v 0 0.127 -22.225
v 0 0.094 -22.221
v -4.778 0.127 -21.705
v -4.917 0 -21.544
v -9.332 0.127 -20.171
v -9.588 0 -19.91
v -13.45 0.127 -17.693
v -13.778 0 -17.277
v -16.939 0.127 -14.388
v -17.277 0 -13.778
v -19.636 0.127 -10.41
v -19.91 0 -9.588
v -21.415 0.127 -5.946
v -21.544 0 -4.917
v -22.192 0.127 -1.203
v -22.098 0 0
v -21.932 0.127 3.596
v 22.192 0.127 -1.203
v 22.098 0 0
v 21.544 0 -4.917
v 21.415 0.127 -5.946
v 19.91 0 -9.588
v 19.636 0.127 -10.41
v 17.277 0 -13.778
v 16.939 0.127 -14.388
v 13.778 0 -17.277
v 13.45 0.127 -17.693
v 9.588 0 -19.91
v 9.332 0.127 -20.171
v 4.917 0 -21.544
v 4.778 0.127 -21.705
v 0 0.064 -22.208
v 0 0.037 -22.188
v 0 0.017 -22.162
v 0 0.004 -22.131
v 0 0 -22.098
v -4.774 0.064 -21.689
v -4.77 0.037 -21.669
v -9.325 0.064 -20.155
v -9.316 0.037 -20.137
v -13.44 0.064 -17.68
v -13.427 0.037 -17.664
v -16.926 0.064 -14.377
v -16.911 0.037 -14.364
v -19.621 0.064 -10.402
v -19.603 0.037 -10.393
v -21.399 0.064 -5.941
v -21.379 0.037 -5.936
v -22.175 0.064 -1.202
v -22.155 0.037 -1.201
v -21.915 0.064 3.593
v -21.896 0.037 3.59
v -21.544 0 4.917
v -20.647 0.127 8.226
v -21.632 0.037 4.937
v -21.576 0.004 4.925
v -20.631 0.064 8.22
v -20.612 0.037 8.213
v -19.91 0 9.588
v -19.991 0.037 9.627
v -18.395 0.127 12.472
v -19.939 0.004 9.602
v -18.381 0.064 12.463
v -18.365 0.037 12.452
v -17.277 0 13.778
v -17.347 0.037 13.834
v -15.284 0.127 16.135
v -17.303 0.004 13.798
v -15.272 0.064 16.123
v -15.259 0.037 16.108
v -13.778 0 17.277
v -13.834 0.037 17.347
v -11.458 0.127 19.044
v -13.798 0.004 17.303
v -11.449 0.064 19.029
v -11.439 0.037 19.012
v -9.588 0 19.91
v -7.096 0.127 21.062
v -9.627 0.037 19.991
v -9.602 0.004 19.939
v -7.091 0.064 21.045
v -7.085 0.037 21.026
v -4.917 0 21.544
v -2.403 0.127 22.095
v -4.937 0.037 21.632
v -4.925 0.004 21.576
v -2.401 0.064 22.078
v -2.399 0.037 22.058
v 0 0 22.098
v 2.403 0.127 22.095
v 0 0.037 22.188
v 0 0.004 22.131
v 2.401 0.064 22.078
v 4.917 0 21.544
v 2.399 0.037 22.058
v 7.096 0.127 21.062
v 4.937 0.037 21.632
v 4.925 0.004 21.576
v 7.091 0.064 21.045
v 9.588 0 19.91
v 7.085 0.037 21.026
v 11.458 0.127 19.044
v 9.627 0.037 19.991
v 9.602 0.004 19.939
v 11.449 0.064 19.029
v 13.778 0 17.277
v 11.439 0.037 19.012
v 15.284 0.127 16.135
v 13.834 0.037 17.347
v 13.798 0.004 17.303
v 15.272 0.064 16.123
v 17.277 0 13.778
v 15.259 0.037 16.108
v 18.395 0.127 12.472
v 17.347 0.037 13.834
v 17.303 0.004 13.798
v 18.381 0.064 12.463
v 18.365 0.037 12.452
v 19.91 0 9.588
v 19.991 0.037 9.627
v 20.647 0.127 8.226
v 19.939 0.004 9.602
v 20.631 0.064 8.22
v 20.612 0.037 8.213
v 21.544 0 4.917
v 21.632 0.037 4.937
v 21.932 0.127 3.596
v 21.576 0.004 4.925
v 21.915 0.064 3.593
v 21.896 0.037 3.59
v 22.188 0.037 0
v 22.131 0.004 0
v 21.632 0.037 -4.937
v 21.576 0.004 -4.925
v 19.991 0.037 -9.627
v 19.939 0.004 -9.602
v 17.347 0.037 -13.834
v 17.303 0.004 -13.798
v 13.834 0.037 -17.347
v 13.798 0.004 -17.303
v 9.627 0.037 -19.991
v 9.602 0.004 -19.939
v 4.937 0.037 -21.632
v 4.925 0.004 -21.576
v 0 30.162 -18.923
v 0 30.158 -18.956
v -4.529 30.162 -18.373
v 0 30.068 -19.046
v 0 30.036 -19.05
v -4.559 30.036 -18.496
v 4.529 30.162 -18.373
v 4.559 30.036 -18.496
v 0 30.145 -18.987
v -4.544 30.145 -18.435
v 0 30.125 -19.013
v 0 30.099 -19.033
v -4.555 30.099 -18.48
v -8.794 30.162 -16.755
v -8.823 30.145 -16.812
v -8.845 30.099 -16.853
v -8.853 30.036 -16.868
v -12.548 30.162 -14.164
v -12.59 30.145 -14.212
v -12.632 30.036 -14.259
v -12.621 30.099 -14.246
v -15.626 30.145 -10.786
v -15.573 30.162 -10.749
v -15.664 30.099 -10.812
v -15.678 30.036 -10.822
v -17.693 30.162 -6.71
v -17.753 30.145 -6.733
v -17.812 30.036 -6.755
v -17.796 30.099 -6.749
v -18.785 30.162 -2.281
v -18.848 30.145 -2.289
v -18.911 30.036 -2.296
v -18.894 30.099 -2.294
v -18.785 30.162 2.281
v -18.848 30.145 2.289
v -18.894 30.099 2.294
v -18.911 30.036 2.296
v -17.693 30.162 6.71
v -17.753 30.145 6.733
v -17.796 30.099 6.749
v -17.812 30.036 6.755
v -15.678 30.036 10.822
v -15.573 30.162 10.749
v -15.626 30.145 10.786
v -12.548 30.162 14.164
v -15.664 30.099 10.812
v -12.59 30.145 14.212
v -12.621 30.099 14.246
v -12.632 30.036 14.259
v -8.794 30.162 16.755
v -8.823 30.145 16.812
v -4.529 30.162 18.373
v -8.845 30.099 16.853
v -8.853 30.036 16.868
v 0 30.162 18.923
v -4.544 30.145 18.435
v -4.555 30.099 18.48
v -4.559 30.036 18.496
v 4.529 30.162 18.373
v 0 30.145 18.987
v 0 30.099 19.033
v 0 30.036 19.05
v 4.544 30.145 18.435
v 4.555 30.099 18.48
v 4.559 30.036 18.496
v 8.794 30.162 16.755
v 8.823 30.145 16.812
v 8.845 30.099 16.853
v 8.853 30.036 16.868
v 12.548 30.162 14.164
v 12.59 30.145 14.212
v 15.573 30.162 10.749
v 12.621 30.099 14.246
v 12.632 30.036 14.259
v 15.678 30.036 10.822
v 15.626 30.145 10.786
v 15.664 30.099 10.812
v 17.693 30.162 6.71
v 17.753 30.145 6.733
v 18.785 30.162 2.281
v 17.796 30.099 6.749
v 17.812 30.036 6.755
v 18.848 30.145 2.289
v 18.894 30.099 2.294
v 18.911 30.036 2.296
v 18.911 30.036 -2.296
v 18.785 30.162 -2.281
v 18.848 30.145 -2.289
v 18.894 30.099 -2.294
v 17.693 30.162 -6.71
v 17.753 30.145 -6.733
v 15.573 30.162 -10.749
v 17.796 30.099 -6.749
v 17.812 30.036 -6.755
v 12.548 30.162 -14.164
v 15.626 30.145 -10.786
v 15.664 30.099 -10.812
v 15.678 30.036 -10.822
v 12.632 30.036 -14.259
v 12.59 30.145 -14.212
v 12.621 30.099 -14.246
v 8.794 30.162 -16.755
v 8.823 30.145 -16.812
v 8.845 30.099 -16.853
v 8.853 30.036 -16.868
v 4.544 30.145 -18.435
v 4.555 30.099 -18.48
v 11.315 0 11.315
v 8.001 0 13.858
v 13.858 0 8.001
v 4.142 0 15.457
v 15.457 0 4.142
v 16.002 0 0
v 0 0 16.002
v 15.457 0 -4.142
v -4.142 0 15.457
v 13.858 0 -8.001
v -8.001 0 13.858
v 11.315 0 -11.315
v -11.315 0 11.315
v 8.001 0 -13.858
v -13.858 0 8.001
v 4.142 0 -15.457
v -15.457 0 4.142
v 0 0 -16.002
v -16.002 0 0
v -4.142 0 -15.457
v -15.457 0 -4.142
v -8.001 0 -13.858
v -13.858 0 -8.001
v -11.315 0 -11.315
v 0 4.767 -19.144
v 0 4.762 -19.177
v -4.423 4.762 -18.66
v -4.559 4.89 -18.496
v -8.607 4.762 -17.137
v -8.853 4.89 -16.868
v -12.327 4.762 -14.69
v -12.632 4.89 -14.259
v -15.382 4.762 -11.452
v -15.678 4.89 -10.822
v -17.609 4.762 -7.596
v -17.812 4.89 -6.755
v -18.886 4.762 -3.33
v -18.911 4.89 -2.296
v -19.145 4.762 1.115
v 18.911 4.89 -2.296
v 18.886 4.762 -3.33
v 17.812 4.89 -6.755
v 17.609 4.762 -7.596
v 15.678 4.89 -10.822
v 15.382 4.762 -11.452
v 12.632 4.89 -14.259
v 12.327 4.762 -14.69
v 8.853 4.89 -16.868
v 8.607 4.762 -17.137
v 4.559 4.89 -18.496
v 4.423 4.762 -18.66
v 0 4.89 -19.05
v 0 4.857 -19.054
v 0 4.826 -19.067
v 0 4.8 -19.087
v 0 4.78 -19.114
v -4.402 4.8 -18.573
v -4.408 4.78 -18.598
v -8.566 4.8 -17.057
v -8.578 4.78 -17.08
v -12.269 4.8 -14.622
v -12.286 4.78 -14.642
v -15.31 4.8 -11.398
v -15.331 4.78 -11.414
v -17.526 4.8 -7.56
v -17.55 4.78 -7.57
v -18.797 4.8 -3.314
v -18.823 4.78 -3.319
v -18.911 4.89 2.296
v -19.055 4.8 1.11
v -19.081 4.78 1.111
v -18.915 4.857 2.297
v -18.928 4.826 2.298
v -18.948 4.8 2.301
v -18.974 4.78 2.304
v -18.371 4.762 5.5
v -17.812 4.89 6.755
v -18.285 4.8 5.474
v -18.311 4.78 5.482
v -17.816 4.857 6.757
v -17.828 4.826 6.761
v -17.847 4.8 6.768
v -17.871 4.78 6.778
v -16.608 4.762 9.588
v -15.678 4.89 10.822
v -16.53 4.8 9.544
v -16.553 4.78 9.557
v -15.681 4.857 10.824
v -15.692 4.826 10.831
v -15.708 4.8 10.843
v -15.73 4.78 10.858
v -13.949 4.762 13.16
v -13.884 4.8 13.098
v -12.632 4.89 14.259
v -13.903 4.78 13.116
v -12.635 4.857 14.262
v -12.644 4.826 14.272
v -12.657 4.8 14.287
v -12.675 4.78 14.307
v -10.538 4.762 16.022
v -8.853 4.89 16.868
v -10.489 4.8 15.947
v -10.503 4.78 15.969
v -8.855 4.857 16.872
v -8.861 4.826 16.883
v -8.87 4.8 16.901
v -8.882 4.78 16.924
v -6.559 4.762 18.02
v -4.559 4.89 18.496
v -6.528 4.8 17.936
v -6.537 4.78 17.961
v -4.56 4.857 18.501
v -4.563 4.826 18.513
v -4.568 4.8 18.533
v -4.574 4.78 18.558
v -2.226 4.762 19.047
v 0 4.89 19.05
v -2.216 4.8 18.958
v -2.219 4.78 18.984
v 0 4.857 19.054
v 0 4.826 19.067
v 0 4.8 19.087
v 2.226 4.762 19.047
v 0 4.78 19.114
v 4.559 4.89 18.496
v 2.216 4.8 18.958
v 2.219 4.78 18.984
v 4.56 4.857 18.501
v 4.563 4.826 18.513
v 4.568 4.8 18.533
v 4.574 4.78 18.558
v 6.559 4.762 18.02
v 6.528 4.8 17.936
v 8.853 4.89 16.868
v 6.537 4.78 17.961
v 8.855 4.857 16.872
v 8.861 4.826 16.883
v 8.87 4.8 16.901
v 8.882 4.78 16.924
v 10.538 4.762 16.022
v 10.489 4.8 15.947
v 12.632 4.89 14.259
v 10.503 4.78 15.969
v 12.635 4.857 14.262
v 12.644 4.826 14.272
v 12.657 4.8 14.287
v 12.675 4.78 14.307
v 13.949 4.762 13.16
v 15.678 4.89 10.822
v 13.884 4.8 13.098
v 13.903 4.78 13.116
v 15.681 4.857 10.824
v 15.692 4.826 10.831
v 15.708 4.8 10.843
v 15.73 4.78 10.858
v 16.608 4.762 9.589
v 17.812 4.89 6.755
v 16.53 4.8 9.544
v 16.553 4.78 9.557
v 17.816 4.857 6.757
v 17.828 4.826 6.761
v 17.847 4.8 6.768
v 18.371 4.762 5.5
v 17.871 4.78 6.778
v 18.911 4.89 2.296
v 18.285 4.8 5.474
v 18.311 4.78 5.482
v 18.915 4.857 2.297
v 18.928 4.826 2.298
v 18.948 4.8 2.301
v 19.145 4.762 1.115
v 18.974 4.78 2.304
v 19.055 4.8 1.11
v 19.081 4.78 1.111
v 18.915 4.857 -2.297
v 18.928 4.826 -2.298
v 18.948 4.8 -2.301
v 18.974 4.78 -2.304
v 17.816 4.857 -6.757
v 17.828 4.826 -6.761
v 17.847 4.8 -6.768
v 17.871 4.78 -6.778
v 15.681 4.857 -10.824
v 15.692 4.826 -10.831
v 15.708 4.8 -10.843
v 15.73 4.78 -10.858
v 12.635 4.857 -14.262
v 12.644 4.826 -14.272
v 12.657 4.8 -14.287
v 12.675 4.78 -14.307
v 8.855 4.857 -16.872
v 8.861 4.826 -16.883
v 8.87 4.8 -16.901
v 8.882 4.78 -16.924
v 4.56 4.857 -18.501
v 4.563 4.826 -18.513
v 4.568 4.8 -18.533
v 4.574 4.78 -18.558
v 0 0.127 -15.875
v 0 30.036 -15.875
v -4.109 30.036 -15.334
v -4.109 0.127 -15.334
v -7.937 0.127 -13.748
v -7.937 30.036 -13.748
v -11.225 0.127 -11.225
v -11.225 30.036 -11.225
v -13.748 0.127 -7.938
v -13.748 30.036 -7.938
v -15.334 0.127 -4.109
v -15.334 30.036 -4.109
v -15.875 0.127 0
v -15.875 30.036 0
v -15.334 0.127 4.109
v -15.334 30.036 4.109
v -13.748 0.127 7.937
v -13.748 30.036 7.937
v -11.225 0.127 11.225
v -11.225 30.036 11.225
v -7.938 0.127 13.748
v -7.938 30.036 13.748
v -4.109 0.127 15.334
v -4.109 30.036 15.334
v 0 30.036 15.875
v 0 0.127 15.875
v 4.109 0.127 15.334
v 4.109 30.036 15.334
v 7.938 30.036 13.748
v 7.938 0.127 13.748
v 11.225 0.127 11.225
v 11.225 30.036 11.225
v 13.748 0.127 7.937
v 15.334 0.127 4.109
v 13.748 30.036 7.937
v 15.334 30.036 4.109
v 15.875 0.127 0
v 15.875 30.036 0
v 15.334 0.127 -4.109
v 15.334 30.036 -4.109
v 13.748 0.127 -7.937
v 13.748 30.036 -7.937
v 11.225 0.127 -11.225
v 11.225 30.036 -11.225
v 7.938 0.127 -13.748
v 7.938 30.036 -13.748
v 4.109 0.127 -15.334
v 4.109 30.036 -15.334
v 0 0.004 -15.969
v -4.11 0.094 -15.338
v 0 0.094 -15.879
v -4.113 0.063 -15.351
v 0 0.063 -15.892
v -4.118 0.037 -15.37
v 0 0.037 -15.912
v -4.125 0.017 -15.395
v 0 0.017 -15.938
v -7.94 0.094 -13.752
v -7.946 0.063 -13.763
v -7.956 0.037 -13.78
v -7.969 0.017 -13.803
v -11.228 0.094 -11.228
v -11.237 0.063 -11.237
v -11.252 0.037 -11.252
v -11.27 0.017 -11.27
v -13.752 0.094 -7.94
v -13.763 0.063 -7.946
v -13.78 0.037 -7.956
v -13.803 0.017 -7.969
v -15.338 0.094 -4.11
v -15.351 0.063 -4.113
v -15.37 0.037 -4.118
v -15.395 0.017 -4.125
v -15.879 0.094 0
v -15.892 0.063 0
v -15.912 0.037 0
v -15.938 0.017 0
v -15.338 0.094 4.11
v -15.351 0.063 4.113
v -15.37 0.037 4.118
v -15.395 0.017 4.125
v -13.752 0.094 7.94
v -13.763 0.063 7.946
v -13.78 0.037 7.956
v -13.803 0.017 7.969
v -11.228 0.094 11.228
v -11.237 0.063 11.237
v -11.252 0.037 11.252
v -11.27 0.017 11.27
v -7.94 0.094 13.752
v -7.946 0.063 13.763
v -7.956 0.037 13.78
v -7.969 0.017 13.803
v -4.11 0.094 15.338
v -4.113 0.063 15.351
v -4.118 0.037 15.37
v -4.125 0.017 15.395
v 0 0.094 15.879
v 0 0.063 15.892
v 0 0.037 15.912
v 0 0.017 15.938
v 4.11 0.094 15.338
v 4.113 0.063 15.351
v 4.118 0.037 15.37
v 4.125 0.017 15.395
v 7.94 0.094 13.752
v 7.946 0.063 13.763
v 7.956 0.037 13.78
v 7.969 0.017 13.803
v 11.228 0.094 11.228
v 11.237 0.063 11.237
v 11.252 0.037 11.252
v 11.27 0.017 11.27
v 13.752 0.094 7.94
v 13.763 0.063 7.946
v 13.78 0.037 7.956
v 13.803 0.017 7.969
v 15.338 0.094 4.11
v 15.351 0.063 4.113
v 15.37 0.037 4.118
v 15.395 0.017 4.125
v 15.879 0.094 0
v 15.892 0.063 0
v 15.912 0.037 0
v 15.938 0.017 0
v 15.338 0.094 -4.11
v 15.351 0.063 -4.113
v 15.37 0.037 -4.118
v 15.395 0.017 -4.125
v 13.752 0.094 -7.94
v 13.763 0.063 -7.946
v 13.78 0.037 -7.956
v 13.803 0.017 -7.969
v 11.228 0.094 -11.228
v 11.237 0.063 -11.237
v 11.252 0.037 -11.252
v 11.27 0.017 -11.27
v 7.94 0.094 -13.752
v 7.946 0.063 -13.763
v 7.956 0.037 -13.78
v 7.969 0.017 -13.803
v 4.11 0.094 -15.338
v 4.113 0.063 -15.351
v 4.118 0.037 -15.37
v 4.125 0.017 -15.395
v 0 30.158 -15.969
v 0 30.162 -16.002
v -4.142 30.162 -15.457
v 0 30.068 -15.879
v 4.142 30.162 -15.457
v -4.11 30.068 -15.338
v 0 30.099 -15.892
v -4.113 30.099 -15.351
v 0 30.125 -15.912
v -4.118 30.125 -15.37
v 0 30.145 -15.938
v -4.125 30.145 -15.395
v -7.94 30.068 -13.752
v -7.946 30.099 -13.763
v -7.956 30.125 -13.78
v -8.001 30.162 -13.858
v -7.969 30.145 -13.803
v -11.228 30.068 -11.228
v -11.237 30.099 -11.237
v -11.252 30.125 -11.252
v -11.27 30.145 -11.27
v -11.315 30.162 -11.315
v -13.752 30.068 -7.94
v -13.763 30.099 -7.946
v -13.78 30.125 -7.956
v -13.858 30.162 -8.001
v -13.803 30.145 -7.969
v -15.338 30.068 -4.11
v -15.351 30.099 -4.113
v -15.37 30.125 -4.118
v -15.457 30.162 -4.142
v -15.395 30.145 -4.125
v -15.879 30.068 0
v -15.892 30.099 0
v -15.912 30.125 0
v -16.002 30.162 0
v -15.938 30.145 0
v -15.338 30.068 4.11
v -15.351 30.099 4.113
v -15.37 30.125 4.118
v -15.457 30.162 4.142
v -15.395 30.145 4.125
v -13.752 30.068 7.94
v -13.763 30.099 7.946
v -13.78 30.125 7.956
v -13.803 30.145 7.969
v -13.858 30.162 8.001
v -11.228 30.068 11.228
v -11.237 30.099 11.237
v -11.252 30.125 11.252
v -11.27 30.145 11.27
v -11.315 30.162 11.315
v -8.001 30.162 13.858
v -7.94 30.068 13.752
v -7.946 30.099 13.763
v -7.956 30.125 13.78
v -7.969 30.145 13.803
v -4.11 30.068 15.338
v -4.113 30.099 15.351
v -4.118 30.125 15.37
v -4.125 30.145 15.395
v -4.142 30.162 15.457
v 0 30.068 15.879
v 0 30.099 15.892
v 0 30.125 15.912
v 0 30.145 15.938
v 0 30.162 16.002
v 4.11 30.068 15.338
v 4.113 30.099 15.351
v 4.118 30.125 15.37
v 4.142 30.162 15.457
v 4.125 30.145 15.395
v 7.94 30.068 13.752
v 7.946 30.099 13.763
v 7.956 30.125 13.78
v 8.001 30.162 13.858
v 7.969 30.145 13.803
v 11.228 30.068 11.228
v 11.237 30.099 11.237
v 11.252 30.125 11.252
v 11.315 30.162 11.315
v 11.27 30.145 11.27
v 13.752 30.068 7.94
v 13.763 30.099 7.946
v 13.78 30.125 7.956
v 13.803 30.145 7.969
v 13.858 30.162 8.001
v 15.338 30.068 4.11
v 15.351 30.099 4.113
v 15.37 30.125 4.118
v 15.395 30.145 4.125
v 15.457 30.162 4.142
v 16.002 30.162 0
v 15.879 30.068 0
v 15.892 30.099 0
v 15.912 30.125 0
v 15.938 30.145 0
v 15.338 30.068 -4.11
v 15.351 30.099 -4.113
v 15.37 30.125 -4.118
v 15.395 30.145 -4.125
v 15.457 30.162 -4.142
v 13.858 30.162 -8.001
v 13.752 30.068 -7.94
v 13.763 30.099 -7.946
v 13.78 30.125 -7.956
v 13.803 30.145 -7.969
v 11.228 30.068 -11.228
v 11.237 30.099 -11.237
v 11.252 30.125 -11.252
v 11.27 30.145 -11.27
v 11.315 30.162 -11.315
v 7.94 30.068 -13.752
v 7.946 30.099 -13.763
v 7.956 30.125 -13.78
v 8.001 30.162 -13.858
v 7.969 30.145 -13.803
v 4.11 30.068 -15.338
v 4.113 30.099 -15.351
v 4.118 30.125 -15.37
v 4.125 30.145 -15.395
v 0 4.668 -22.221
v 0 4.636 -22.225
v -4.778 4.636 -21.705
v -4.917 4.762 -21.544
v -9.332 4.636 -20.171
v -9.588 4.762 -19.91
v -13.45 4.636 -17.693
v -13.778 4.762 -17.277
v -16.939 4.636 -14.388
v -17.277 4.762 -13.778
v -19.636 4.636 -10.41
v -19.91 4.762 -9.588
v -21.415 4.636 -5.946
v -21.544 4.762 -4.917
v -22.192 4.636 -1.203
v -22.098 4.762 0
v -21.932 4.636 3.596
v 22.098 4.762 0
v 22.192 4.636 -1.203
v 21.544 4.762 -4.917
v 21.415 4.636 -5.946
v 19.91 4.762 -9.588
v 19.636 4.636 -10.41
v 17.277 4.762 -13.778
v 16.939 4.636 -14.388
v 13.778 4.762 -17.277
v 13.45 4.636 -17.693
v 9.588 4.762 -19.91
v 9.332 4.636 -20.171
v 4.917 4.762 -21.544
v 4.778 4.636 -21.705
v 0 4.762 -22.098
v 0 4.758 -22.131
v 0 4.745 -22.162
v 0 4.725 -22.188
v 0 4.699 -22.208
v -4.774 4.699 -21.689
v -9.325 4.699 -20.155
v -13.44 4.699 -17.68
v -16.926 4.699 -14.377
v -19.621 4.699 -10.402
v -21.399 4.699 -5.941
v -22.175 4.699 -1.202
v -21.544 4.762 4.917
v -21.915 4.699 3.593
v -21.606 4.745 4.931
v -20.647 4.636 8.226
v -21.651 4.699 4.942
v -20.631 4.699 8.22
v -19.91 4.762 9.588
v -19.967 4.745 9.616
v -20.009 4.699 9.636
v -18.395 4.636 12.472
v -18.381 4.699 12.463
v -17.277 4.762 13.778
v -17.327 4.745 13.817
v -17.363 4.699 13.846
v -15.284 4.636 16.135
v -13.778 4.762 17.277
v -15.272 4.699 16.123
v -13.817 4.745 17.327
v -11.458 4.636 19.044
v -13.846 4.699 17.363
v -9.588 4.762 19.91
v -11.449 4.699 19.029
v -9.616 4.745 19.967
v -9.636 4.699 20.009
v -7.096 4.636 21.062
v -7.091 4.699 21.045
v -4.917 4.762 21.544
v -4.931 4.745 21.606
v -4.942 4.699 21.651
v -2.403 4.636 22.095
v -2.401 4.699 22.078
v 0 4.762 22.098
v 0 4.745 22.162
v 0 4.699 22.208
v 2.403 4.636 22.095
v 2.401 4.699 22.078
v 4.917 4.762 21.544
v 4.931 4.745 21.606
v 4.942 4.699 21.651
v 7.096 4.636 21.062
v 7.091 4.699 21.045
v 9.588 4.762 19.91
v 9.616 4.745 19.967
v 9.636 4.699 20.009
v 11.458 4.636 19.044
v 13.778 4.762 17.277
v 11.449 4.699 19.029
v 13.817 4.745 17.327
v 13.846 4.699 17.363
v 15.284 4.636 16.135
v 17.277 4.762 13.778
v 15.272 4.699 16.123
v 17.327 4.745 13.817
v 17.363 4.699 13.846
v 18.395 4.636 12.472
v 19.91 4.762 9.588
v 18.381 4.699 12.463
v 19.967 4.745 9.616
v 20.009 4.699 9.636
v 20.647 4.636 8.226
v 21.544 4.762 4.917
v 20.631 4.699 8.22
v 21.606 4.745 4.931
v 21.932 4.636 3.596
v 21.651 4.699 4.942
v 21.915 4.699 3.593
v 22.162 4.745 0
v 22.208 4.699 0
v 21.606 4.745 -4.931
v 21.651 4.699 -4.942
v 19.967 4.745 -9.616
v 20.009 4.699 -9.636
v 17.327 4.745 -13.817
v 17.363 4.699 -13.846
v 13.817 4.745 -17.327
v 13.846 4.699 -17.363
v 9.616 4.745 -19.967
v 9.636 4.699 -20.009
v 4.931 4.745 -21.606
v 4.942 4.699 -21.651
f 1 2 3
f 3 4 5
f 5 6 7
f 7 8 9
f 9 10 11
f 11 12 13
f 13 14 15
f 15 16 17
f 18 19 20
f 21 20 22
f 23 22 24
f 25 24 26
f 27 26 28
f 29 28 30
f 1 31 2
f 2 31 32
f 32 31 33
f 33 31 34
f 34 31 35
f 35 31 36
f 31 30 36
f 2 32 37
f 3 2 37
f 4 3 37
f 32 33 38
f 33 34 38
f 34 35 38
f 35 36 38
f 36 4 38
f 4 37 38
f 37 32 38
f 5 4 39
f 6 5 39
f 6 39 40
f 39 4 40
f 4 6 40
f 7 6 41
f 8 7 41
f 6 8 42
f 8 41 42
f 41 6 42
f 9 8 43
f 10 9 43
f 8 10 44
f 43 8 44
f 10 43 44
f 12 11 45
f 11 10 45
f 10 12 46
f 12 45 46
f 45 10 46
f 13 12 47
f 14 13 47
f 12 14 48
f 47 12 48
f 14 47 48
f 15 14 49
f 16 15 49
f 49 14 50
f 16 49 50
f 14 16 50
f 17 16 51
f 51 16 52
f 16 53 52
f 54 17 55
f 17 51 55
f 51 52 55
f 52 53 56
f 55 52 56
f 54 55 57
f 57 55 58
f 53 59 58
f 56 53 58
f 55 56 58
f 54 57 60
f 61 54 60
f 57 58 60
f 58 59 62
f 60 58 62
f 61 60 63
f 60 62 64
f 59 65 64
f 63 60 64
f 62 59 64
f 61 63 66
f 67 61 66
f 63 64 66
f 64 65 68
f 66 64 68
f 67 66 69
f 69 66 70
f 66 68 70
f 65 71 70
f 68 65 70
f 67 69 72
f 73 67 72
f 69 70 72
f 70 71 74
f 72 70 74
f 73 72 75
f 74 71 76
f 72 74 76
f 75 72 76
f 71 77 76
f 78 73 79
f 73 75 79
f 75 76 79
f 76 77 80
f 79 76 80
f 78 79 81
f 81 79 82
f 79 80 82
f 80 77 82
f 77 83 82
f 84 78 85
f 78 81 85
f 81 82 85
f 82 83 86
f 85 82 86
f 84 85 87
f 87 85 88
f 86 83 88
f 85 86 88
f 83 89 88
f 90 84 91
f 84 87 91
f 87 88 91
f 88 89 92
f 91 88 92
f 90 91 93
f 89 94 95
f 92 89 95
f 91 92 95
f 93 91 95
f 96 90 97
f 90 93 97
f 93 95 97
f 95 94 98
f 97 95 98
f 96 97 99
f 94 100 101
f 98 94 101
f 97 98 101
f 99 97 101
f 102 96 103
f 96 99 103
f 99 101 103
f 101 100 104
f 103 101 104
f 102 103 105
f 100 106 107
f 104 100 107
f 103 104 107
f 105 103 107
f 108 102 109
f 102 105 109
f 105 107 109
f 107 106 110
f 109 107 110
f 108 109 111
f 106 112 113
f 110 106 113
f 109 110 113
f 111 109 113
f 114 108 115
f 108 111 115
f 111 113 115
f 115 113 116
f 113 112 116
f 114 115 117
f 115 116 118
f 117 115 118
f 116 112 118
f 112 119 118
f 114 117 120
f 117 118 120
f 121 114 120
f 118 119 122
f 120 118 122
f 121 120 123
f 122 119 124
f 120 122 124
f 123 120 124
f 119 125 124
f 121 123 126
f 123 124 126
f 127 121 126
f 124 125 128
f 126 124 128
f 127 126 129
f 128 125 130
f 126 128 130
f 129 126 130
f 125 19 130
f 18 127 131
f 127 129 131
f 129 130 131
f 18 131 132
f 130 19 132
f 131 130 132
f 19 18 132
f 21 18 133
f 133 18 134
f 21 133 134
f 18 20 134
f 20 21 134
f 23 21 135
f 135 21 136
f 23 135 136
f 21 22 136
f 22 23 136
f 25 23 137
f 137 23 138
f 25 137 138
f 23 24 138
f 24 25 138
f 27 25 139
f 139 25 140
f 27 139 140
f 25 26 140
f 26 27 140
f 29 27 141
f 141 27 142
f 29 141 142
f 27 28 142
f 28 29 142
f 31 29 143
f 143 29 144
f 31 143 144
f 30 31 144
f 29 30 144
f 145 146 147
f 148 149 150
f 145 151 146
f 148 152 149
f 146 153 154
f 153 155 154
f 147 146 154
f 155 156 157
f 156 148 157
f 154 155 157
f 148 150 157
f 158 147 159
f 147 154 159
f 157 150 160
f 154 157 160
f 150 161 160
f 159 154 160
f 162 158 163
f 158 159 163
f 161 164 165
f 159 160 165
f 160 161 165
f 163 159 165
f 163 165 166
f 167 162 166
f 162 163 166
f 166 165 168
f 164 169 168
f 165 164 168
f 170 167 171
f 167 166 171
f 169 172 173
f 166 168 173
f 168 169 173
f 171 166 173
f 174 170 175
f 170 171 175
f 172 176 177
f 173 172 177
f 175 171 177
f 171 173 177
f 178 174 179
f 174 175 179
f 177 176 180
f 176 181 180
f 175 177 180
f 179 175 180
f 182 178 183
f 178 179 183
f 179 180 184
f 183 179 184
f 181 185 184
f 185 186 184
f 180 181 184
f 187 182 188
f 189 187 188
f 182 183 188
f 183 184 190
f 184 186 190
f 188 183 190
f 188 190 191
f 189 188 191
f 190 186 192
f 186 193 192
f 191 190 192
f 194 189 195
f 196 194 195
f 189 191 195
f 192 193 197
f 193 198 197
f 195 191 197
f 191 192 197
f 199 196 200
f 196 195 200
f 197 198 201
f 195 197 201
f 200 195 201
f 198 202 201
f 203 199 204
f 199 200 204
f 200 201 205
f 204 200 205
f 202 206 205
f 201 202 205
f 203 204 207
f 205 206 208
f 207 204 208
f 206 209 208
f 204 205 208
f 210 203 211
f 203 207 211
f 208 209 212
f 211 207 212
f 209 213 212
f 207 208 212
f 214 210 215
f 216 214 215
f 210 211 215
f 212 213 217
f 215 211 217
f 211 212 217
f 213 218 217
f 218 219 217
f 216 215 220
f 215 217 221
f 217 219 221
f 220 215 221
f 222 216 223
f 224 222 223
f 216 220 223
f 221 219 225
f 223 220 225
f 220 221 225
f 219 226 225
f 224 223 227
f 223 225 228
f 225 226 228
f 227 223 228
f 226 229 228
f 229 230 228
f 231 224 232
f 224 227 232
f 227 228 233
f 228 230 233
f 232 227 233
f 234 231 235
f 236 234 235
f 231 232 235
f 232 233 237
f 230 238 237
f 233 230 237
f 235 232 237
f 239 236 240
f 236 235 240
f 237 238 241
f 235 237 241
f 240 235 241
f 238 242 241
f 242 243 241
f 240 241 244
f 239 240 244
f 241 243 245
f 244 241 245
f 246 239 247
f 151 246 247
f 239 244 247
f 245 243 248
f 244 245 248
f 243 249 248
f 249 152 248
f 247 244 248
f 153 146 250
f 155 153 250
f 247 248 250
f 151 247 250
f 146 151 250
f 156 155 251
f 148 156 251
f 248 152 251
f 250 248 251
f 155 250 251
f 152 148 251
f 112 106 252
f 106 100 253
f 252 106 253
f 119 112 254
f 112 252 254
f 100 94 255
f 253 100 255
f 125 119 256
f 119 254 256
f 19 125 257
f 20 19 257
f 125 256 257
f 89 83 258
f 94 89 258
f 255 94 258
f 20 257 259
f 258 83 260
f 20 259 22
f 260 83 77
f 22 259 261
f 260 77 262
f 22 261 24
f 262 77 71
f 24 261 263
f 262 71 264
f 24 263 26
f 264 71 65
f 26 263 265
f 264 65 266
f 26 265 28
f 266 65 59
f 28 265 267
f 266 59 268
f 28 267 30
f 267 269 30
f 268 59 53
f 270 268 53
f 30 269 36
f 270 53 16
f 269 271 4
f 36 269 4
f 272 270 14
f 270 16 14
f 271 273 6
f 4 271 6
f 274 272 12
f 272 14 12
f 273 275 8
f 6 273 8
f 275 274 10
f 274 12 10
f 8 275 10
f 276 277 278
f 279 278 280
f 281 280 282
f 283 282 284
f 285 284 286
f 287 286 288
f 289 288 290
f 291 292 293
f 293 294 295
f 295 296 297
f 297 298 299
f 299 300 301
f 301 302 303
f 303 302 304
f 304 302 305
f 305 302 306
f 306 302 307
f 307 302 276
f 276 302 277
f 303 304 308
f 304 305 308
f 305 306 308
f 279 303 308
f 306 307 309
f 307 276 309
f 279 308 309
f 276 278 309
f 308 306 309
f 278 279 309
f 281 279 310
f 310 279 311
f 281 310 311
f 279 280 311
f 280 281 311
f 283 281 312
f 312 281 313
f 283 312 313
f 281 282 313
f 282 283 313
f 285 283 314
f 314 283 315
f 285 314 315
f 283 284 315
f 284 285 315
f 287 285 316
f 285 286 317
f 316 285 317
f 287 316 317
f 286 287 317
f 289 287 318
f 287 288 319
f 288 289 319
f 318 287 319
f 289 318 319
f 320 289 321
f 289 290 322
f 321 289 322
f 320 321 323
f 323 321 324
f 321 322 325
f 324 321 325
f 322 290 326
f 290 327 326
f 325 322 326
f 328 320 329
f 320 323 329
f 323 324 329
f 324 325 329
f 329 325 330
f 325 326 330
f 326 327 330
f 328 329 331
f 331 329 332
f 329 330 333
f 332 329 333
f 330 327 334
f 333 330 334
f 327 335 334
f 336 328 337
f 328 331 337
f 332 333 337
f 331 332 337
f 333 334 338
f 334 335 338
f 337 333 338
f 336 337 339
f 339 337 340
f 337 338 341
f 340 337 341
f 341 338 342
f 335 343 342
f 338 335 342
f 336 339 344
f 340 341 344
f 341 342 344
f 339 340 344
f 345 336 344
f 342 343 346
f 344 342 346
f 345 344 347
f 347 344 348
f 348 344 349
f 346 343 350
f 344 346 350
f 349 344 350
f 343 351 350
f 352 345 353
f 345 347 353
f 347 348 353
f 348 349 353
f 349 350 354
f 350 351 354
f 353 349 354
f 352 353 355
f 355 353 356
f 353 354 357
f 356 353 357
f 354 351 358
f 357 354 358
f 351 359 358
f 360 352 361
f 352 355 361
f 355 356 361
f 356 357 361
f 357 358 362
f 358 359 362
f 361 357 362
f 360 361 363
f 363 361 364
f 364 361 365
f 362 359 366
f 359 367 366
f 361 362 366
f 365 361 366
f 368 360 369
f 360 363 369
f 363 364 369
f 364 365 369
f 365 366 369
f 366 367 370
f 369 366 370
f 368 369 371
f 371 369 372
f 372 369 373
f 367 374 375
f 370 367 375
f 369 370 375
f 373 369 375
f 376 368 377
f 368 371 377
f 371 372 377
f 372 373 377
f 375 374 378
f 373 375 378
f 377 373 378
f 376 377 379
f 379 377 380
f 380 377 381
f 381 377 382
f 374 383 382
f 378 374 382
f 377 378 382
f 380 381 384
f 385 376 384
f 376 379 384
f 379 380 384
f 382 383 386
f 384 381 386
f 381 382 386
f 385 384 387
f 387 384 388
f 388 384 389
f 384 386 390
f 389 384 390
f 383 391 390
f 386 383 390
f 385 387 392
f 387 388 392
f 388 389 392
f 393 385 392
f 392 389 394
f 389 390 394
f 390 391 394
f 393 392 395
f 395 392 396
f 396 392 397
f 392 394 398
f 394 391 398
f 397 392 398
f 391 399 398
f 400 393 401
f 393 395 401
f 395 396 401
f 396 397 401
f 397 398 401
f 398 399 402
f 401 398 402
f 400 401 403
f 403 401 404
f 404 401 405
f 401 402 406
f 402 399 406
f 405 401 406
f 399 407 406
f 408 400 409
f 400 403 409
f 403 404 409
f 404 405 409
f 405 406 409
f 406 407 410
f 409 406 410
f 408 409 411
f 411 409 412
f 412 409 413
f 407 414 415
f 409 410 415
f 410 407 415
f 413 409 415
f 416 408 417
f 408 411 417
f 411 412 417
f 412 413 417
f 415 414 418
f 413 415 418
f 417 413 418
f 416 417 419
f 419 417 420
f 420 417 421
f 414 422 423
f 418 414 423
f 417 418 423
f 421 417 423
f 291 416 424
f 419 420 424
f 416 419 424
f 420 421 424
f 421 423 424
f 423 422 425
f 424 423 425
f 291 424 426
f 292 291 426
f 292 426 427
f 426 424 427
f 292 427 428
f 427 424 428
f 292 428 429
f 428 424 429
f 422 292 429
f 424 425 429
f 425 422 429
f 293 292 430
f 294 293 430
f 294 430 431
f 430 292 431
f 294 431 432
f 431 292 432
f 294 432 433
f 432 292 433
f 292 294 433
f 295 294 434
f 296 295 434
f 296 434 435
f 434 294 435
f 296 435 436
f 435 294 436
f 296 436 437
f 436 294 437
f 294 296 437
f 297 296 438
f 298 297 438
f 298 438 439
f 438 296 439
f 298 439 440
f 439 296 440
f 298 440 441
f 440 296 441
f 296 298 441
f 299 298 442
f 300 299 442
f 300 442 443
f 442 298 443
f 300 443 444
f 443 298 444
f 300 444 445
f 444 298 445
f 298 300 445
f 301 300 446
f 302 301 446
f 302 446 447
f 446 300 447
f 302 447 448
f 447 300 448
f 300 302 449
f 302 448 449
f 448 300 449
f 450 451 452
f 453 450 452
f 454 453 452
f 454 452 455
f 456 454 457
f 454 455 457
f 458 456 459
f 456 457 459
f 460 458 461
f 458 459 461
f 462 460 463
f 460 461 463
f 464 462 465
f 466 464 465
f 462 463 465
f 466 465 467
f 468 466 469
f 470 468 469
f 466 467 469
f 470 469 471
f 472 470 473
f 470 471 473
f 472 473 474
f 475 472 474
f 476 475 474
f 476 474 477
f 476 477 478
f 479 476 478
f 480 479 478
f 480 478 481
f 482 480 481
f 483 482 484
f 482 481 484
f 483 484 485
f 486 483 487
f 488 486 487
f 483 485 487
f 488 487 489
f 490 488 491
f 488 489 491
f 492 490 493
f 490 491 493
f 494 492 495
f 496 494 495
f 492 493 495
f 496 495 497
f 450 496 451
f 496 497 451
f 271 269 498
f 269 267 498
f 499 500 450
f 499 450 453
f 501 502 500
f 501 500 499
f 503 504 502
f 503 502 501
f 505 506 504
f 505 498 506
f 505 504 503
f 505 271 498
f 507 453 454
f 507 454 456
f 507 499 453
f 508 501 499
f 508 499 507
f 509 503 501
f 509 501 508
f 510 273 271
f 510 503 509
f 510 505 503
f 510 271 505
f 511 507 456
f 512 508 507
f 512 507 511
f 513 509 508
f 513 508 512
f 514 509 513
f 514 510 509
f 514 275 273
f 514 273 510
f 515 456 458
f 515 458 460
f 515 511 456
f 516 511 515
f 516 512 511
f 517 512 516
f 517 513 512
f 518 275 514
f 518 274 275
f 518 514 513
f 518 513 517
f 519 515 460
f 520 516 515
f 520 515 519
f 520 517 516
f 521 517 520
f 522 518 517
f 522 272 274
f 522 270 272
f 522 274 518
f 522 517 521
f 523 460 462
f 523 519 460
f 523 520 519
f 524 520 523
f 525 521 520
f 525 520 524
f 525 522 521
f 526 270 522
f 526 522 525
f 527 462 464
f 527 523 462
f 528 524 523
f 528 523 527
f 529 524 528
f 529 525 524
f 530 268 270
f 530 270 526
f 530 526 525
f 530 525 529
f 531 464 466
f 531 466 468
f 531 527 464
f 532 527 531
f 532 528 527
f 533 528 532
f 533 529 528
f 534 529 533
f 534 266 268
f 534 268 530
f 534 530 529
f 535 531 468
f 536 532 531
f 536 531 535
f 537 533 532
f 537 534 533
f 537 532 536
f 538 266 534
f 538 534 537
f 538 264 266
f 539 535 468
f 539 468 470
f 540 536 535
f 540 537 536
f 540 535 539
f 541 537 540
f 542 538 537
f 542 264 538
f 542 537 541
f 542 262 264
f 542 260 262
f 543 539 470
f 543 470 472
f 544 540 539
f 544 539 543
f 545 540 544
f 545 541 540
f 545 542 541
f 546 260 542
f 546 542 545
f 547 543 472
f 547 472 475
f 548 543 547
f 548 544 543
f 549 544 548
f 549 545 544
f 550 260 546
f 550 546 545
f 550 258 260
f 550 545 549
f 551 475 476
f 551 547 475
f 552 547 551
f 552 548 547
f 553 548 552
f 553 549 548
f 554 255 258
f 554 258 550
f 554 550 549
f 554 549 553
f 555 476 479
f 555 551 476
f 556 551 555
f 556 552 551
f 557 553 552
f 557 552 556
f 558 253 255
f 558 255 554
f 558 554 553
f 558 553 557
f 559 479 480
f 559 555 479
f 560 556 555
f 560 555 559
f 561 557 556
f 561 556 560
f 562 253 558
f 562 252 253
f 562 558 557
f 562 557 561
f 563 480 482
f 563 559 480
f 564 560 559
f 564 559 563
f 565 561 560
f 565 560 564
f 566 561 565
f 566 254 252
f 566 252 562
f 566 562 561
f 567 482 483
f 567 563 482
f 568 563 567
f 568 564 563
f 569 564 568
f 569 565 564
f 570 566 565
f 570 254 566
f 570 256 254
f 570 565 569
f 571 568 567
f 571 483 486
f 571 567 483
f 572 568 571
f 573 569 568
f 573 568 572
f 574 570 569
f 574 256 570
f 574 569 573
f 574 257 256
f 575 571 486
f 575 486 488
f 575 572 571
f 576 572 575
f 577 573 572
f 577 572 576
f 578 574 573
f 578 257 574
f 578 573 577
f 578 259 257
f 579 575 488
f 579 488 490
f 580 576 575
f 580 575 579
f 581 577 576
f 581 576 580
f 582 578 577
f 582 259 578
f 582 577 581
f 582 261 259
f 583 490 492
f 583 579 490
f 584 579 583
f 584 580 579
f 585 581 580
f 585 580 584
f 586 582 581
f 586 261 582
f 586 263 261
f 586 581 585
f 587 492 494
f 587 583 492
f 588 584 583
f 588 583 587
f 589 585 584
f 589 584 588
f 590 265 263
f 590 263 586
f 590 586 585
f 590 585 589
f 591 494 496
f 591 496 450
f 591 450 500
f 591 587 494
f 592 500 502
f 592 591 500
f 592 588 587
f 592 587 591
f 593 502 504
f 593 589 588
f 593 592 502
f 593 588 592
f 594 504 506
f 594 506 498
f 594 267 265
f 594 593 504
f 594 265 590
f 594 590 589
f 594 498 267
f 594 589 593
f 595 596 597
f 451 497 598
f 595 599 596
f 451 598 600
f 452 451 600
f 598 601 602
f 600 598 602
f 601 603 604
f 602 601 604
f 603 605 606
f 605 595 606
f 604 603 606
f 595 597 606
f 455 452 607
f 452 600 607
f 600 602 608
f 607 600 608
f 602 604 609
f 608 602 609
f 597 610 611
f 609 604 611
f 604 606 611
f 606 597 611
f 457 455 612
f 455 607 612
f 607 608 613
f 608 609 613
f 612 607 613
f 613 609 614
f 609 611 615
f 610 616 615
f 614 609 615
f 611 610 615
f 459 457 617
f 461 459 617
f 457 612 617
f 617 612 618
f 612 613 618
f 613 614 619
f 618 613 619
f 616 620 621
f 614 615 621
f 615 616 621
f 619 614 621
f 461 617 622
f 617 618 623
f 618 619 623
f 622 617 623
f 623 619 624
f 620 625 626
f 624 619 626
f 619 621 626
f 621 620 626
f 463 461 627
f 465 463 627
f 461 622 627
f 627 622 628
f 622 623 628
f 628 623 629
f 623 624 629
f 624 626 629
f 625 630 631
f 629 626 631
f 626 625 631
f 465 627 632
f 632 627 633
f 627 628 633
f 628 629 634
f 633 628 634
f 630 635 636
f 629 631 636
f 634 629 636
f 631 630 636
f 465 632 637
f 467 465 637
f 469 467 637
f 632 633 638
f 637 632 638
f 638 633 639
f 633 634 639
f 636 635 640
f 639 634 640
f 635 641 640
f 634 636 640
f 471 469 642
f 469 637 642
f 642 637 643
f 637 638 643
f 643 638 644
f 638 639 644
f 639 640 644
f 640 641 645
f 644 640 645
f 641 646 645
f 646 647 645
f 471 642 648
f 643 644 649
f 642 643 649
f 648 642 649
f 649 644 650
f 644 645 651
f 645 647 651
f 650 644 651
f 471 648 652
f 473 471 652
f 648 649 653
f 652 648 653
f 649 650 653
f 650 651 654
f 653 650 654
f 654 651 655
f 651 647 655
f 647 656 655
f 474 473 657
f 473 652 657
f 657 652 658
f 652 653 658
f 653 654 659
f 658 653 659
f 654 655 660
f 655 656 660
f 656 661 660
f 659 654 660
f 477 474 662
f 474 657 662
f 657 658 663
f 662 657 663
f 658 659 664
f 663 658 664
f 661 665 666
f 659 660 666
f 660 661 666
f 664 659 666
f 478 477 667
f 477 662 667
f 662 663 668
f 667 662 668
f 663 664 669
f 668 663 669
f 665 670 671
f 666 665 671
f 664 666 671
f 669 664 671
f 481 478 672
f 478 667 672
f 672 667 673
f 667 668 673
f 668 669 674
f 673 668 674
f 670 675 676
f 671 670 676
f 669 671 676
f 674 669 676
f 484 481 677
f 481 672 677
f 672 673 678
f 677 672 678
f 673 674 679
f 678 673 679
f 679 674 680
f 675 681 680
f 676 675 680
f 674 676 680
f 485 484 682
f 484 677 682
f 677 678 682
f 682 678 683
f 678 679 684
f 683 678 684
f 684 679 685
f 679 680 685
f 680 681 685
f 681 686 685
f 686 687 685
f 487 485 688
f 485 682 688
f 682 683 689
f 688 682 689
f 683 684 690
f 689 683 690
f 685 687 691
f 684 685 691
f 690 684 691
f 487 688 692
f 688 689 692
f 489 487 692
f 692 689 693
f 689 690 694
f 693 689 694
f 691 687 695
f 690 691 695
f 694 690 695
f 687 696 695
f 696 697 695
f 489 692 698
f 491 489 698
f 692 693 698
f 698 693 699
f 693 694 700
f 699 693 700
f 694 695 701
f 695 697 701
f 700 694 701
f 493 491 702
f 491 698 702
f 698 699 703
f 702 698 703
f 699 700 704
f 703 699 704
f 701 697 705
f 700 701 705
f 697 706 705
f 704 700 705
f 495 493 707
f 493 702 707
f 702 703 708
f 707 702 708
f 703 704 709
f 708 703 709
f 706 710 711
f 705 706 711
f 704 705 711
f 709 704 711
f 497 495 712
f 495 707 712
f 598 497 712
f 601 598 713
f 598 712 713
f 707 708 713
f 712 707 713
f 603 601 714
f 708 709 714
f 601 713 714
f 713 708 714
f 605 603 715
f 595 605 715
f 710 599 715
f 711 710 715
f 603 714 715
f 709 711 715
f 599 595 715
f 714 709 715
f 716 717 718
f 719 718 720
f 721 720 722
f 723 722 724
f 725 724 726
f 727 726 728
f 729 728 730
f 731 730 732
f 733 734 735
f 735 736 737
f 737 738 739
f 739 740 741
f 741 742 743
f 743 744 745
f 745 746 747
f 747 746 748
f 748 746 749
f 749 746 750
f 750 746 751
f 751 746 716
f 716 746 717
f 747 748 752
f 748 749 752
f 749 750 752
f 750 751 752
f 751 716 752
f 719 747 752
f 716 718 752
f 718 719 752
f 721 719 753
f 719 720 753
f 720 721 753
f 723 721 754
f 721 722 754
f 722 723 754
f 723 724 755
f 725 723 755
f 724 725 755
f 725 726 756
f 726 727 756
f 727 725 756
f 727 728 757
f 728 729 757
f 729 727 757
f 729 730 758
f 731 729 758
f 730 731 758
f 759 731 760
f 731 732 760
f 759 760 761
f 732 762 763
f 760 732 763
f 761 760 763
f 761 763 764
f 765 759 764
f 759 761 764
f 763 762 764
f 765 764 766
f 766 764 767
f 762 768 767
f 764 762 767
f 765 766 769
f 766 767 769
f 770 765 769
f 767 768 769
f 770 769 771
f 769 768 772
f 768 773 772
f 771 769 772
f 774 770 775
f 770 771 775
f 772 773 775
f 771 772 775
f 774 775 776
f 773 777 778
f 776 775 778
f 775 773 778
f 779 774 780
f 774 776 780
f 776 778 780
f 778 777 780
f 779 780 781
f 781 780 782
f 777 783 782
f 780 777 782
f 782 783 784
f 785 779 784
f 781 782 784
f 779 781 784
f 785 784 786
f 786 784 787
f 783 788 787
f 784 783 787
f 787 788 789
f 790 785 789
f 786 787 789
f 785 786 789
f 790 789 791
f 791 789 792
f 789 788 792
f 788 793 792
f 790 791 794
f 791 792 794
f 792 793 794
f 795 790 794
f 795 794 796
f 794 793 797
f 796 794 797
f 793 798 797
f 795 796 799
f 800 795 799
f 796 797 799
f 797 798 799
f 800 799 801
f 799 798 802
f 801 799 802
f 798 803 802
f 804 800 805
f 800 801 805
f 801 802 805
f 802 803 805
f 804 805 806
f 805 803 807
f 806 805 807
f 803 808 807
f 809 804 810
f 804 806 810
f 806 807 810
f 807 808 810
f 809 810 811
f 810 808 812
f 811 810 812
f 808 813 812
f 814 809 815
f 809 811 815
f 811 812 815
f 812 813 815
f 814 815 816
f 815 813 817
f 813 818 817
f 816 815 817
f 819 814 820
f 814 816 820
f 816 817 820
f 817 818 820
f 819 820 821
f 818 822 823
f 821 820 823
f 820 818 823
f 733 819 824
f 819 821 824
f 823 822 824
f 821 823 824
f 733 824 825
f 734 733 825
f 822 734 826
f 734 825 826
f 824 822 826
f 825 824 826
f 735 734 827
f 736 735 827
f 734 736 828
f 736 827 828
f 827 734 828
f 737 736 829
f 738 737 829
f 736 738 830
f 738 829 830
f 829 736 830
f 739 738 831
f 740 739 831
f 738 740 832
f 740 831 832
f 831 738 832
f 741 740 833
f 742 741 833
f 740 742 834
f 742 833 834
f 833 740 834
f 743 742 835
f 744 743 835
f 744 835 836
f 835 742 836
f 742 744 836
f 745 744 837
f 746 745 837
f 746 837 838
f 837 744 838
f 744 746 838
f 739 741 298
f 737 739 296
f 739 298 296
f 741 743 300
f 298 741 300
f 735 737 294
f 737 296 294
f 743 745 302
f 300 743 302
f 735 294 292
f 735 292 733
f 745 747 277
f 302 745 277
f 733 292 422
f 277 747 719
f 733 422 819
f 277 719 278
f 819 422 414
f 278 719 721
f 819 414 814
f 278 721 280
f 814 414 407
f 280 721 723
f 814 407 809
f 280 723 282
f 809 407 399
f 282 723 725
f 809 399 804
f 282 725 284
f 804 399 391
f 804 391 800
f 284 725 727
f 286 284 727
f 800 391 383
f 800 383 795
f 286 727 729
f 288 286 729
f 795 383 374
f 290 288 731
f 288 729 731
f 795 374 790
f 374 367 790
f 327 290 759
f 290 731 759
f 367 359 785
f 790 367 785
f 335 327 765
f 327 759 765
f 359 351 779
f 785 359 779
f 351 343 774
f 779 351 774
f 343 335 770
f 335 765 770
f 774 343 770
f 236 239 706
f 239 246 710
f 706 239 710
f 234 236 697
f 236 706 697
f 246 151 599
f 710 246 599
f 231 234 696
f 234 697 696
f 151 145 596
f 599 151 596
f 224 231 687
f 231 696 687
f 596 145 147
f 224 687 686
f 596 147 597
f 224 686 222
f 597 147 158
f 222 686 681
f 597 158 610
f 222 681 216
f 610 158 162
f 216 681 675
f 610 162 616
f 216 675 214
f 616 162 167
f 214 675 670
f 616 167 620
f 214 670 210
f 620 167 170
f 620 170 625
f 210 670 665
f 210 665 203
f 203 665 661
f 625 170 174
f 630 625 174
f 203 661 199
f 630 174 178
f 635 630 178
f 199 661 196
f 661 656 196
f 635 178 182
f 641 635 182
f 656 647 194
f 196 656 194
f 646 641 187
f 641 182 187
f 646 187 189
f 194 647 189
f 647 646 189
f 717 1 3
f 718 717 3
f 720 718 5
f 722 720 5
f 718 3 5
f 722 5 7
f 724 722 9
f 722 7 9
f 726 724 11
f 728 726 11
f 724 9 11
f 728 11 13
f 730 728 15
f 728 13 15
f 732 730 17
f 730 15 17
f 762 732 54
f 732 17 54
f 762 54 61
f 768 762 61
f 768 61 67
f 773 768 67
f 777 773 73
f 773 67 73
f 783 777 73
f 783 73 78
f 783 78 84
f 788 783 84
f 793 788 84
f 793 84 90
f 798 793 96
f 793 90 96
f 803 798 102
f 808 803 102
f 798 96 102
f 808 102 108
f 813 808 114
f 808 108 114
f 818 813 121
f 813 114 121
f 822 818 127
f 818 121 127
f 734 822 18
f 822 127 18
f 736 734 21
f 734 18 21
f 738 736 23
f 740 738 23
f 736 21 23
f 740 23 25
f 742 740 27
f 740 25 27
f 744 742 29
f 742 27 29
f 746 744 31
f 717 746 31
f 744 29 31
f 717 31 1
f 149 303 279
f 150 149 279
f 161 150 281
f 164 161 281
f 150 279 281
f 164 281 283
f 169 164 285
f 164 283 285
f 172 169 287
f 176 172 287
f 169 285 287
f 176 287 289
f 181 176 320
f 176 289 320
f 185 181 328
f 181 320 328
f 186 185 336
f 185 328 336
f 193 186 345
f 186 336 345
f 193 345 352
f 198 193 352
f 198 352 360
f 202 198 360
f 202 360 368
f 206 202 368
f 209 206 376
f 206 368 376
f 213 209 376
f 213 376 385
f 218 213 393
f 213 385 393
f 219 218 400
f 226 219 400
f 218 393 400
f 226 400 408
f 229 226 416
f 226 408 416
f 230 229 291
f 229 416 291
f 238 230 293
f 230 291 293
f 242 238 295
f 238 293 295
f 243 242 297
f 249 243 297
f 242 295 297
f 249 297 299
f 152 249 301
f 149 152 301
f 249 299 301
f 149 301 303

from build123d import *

# Parameters (mm, degrees)
FILLET1_R = 0.127


with BuildPart() as part:
    # Sketch1 → Revolve1 (revolve)
    with BuildSketch(Plane.XY, mode=Mode.PRIVATE) as revolve1_sk:
        Polygon((15.875, 0), (15.875, 30.1625), (19.05, 30.1625), (19.05, 4.7625), (22.225, 4.7625), (22.225, 0), align=None)
    revolve(revolve1_sk.sketch.rotate(Axis((0, 0, 0), (0, 1, 0)), 90), axis=Axis((0, 0, 0), (0, 1, 0)))

    # Fillet1
    fillet1_edges = [part.edges().sort_by_distance(p)[0] for p in [
        (0, 0, 22.225),
        (0, 4.7625, 22.225),
        (0, 4.7625, 19.05),
        (0, 30.1625, 19.05),
        (0, 30.1625, 15.875),
        (0, 0, 15.875),
    ]]
    fillet(fillet1_edges, radius=FILLET1_R)


solid = part.part
